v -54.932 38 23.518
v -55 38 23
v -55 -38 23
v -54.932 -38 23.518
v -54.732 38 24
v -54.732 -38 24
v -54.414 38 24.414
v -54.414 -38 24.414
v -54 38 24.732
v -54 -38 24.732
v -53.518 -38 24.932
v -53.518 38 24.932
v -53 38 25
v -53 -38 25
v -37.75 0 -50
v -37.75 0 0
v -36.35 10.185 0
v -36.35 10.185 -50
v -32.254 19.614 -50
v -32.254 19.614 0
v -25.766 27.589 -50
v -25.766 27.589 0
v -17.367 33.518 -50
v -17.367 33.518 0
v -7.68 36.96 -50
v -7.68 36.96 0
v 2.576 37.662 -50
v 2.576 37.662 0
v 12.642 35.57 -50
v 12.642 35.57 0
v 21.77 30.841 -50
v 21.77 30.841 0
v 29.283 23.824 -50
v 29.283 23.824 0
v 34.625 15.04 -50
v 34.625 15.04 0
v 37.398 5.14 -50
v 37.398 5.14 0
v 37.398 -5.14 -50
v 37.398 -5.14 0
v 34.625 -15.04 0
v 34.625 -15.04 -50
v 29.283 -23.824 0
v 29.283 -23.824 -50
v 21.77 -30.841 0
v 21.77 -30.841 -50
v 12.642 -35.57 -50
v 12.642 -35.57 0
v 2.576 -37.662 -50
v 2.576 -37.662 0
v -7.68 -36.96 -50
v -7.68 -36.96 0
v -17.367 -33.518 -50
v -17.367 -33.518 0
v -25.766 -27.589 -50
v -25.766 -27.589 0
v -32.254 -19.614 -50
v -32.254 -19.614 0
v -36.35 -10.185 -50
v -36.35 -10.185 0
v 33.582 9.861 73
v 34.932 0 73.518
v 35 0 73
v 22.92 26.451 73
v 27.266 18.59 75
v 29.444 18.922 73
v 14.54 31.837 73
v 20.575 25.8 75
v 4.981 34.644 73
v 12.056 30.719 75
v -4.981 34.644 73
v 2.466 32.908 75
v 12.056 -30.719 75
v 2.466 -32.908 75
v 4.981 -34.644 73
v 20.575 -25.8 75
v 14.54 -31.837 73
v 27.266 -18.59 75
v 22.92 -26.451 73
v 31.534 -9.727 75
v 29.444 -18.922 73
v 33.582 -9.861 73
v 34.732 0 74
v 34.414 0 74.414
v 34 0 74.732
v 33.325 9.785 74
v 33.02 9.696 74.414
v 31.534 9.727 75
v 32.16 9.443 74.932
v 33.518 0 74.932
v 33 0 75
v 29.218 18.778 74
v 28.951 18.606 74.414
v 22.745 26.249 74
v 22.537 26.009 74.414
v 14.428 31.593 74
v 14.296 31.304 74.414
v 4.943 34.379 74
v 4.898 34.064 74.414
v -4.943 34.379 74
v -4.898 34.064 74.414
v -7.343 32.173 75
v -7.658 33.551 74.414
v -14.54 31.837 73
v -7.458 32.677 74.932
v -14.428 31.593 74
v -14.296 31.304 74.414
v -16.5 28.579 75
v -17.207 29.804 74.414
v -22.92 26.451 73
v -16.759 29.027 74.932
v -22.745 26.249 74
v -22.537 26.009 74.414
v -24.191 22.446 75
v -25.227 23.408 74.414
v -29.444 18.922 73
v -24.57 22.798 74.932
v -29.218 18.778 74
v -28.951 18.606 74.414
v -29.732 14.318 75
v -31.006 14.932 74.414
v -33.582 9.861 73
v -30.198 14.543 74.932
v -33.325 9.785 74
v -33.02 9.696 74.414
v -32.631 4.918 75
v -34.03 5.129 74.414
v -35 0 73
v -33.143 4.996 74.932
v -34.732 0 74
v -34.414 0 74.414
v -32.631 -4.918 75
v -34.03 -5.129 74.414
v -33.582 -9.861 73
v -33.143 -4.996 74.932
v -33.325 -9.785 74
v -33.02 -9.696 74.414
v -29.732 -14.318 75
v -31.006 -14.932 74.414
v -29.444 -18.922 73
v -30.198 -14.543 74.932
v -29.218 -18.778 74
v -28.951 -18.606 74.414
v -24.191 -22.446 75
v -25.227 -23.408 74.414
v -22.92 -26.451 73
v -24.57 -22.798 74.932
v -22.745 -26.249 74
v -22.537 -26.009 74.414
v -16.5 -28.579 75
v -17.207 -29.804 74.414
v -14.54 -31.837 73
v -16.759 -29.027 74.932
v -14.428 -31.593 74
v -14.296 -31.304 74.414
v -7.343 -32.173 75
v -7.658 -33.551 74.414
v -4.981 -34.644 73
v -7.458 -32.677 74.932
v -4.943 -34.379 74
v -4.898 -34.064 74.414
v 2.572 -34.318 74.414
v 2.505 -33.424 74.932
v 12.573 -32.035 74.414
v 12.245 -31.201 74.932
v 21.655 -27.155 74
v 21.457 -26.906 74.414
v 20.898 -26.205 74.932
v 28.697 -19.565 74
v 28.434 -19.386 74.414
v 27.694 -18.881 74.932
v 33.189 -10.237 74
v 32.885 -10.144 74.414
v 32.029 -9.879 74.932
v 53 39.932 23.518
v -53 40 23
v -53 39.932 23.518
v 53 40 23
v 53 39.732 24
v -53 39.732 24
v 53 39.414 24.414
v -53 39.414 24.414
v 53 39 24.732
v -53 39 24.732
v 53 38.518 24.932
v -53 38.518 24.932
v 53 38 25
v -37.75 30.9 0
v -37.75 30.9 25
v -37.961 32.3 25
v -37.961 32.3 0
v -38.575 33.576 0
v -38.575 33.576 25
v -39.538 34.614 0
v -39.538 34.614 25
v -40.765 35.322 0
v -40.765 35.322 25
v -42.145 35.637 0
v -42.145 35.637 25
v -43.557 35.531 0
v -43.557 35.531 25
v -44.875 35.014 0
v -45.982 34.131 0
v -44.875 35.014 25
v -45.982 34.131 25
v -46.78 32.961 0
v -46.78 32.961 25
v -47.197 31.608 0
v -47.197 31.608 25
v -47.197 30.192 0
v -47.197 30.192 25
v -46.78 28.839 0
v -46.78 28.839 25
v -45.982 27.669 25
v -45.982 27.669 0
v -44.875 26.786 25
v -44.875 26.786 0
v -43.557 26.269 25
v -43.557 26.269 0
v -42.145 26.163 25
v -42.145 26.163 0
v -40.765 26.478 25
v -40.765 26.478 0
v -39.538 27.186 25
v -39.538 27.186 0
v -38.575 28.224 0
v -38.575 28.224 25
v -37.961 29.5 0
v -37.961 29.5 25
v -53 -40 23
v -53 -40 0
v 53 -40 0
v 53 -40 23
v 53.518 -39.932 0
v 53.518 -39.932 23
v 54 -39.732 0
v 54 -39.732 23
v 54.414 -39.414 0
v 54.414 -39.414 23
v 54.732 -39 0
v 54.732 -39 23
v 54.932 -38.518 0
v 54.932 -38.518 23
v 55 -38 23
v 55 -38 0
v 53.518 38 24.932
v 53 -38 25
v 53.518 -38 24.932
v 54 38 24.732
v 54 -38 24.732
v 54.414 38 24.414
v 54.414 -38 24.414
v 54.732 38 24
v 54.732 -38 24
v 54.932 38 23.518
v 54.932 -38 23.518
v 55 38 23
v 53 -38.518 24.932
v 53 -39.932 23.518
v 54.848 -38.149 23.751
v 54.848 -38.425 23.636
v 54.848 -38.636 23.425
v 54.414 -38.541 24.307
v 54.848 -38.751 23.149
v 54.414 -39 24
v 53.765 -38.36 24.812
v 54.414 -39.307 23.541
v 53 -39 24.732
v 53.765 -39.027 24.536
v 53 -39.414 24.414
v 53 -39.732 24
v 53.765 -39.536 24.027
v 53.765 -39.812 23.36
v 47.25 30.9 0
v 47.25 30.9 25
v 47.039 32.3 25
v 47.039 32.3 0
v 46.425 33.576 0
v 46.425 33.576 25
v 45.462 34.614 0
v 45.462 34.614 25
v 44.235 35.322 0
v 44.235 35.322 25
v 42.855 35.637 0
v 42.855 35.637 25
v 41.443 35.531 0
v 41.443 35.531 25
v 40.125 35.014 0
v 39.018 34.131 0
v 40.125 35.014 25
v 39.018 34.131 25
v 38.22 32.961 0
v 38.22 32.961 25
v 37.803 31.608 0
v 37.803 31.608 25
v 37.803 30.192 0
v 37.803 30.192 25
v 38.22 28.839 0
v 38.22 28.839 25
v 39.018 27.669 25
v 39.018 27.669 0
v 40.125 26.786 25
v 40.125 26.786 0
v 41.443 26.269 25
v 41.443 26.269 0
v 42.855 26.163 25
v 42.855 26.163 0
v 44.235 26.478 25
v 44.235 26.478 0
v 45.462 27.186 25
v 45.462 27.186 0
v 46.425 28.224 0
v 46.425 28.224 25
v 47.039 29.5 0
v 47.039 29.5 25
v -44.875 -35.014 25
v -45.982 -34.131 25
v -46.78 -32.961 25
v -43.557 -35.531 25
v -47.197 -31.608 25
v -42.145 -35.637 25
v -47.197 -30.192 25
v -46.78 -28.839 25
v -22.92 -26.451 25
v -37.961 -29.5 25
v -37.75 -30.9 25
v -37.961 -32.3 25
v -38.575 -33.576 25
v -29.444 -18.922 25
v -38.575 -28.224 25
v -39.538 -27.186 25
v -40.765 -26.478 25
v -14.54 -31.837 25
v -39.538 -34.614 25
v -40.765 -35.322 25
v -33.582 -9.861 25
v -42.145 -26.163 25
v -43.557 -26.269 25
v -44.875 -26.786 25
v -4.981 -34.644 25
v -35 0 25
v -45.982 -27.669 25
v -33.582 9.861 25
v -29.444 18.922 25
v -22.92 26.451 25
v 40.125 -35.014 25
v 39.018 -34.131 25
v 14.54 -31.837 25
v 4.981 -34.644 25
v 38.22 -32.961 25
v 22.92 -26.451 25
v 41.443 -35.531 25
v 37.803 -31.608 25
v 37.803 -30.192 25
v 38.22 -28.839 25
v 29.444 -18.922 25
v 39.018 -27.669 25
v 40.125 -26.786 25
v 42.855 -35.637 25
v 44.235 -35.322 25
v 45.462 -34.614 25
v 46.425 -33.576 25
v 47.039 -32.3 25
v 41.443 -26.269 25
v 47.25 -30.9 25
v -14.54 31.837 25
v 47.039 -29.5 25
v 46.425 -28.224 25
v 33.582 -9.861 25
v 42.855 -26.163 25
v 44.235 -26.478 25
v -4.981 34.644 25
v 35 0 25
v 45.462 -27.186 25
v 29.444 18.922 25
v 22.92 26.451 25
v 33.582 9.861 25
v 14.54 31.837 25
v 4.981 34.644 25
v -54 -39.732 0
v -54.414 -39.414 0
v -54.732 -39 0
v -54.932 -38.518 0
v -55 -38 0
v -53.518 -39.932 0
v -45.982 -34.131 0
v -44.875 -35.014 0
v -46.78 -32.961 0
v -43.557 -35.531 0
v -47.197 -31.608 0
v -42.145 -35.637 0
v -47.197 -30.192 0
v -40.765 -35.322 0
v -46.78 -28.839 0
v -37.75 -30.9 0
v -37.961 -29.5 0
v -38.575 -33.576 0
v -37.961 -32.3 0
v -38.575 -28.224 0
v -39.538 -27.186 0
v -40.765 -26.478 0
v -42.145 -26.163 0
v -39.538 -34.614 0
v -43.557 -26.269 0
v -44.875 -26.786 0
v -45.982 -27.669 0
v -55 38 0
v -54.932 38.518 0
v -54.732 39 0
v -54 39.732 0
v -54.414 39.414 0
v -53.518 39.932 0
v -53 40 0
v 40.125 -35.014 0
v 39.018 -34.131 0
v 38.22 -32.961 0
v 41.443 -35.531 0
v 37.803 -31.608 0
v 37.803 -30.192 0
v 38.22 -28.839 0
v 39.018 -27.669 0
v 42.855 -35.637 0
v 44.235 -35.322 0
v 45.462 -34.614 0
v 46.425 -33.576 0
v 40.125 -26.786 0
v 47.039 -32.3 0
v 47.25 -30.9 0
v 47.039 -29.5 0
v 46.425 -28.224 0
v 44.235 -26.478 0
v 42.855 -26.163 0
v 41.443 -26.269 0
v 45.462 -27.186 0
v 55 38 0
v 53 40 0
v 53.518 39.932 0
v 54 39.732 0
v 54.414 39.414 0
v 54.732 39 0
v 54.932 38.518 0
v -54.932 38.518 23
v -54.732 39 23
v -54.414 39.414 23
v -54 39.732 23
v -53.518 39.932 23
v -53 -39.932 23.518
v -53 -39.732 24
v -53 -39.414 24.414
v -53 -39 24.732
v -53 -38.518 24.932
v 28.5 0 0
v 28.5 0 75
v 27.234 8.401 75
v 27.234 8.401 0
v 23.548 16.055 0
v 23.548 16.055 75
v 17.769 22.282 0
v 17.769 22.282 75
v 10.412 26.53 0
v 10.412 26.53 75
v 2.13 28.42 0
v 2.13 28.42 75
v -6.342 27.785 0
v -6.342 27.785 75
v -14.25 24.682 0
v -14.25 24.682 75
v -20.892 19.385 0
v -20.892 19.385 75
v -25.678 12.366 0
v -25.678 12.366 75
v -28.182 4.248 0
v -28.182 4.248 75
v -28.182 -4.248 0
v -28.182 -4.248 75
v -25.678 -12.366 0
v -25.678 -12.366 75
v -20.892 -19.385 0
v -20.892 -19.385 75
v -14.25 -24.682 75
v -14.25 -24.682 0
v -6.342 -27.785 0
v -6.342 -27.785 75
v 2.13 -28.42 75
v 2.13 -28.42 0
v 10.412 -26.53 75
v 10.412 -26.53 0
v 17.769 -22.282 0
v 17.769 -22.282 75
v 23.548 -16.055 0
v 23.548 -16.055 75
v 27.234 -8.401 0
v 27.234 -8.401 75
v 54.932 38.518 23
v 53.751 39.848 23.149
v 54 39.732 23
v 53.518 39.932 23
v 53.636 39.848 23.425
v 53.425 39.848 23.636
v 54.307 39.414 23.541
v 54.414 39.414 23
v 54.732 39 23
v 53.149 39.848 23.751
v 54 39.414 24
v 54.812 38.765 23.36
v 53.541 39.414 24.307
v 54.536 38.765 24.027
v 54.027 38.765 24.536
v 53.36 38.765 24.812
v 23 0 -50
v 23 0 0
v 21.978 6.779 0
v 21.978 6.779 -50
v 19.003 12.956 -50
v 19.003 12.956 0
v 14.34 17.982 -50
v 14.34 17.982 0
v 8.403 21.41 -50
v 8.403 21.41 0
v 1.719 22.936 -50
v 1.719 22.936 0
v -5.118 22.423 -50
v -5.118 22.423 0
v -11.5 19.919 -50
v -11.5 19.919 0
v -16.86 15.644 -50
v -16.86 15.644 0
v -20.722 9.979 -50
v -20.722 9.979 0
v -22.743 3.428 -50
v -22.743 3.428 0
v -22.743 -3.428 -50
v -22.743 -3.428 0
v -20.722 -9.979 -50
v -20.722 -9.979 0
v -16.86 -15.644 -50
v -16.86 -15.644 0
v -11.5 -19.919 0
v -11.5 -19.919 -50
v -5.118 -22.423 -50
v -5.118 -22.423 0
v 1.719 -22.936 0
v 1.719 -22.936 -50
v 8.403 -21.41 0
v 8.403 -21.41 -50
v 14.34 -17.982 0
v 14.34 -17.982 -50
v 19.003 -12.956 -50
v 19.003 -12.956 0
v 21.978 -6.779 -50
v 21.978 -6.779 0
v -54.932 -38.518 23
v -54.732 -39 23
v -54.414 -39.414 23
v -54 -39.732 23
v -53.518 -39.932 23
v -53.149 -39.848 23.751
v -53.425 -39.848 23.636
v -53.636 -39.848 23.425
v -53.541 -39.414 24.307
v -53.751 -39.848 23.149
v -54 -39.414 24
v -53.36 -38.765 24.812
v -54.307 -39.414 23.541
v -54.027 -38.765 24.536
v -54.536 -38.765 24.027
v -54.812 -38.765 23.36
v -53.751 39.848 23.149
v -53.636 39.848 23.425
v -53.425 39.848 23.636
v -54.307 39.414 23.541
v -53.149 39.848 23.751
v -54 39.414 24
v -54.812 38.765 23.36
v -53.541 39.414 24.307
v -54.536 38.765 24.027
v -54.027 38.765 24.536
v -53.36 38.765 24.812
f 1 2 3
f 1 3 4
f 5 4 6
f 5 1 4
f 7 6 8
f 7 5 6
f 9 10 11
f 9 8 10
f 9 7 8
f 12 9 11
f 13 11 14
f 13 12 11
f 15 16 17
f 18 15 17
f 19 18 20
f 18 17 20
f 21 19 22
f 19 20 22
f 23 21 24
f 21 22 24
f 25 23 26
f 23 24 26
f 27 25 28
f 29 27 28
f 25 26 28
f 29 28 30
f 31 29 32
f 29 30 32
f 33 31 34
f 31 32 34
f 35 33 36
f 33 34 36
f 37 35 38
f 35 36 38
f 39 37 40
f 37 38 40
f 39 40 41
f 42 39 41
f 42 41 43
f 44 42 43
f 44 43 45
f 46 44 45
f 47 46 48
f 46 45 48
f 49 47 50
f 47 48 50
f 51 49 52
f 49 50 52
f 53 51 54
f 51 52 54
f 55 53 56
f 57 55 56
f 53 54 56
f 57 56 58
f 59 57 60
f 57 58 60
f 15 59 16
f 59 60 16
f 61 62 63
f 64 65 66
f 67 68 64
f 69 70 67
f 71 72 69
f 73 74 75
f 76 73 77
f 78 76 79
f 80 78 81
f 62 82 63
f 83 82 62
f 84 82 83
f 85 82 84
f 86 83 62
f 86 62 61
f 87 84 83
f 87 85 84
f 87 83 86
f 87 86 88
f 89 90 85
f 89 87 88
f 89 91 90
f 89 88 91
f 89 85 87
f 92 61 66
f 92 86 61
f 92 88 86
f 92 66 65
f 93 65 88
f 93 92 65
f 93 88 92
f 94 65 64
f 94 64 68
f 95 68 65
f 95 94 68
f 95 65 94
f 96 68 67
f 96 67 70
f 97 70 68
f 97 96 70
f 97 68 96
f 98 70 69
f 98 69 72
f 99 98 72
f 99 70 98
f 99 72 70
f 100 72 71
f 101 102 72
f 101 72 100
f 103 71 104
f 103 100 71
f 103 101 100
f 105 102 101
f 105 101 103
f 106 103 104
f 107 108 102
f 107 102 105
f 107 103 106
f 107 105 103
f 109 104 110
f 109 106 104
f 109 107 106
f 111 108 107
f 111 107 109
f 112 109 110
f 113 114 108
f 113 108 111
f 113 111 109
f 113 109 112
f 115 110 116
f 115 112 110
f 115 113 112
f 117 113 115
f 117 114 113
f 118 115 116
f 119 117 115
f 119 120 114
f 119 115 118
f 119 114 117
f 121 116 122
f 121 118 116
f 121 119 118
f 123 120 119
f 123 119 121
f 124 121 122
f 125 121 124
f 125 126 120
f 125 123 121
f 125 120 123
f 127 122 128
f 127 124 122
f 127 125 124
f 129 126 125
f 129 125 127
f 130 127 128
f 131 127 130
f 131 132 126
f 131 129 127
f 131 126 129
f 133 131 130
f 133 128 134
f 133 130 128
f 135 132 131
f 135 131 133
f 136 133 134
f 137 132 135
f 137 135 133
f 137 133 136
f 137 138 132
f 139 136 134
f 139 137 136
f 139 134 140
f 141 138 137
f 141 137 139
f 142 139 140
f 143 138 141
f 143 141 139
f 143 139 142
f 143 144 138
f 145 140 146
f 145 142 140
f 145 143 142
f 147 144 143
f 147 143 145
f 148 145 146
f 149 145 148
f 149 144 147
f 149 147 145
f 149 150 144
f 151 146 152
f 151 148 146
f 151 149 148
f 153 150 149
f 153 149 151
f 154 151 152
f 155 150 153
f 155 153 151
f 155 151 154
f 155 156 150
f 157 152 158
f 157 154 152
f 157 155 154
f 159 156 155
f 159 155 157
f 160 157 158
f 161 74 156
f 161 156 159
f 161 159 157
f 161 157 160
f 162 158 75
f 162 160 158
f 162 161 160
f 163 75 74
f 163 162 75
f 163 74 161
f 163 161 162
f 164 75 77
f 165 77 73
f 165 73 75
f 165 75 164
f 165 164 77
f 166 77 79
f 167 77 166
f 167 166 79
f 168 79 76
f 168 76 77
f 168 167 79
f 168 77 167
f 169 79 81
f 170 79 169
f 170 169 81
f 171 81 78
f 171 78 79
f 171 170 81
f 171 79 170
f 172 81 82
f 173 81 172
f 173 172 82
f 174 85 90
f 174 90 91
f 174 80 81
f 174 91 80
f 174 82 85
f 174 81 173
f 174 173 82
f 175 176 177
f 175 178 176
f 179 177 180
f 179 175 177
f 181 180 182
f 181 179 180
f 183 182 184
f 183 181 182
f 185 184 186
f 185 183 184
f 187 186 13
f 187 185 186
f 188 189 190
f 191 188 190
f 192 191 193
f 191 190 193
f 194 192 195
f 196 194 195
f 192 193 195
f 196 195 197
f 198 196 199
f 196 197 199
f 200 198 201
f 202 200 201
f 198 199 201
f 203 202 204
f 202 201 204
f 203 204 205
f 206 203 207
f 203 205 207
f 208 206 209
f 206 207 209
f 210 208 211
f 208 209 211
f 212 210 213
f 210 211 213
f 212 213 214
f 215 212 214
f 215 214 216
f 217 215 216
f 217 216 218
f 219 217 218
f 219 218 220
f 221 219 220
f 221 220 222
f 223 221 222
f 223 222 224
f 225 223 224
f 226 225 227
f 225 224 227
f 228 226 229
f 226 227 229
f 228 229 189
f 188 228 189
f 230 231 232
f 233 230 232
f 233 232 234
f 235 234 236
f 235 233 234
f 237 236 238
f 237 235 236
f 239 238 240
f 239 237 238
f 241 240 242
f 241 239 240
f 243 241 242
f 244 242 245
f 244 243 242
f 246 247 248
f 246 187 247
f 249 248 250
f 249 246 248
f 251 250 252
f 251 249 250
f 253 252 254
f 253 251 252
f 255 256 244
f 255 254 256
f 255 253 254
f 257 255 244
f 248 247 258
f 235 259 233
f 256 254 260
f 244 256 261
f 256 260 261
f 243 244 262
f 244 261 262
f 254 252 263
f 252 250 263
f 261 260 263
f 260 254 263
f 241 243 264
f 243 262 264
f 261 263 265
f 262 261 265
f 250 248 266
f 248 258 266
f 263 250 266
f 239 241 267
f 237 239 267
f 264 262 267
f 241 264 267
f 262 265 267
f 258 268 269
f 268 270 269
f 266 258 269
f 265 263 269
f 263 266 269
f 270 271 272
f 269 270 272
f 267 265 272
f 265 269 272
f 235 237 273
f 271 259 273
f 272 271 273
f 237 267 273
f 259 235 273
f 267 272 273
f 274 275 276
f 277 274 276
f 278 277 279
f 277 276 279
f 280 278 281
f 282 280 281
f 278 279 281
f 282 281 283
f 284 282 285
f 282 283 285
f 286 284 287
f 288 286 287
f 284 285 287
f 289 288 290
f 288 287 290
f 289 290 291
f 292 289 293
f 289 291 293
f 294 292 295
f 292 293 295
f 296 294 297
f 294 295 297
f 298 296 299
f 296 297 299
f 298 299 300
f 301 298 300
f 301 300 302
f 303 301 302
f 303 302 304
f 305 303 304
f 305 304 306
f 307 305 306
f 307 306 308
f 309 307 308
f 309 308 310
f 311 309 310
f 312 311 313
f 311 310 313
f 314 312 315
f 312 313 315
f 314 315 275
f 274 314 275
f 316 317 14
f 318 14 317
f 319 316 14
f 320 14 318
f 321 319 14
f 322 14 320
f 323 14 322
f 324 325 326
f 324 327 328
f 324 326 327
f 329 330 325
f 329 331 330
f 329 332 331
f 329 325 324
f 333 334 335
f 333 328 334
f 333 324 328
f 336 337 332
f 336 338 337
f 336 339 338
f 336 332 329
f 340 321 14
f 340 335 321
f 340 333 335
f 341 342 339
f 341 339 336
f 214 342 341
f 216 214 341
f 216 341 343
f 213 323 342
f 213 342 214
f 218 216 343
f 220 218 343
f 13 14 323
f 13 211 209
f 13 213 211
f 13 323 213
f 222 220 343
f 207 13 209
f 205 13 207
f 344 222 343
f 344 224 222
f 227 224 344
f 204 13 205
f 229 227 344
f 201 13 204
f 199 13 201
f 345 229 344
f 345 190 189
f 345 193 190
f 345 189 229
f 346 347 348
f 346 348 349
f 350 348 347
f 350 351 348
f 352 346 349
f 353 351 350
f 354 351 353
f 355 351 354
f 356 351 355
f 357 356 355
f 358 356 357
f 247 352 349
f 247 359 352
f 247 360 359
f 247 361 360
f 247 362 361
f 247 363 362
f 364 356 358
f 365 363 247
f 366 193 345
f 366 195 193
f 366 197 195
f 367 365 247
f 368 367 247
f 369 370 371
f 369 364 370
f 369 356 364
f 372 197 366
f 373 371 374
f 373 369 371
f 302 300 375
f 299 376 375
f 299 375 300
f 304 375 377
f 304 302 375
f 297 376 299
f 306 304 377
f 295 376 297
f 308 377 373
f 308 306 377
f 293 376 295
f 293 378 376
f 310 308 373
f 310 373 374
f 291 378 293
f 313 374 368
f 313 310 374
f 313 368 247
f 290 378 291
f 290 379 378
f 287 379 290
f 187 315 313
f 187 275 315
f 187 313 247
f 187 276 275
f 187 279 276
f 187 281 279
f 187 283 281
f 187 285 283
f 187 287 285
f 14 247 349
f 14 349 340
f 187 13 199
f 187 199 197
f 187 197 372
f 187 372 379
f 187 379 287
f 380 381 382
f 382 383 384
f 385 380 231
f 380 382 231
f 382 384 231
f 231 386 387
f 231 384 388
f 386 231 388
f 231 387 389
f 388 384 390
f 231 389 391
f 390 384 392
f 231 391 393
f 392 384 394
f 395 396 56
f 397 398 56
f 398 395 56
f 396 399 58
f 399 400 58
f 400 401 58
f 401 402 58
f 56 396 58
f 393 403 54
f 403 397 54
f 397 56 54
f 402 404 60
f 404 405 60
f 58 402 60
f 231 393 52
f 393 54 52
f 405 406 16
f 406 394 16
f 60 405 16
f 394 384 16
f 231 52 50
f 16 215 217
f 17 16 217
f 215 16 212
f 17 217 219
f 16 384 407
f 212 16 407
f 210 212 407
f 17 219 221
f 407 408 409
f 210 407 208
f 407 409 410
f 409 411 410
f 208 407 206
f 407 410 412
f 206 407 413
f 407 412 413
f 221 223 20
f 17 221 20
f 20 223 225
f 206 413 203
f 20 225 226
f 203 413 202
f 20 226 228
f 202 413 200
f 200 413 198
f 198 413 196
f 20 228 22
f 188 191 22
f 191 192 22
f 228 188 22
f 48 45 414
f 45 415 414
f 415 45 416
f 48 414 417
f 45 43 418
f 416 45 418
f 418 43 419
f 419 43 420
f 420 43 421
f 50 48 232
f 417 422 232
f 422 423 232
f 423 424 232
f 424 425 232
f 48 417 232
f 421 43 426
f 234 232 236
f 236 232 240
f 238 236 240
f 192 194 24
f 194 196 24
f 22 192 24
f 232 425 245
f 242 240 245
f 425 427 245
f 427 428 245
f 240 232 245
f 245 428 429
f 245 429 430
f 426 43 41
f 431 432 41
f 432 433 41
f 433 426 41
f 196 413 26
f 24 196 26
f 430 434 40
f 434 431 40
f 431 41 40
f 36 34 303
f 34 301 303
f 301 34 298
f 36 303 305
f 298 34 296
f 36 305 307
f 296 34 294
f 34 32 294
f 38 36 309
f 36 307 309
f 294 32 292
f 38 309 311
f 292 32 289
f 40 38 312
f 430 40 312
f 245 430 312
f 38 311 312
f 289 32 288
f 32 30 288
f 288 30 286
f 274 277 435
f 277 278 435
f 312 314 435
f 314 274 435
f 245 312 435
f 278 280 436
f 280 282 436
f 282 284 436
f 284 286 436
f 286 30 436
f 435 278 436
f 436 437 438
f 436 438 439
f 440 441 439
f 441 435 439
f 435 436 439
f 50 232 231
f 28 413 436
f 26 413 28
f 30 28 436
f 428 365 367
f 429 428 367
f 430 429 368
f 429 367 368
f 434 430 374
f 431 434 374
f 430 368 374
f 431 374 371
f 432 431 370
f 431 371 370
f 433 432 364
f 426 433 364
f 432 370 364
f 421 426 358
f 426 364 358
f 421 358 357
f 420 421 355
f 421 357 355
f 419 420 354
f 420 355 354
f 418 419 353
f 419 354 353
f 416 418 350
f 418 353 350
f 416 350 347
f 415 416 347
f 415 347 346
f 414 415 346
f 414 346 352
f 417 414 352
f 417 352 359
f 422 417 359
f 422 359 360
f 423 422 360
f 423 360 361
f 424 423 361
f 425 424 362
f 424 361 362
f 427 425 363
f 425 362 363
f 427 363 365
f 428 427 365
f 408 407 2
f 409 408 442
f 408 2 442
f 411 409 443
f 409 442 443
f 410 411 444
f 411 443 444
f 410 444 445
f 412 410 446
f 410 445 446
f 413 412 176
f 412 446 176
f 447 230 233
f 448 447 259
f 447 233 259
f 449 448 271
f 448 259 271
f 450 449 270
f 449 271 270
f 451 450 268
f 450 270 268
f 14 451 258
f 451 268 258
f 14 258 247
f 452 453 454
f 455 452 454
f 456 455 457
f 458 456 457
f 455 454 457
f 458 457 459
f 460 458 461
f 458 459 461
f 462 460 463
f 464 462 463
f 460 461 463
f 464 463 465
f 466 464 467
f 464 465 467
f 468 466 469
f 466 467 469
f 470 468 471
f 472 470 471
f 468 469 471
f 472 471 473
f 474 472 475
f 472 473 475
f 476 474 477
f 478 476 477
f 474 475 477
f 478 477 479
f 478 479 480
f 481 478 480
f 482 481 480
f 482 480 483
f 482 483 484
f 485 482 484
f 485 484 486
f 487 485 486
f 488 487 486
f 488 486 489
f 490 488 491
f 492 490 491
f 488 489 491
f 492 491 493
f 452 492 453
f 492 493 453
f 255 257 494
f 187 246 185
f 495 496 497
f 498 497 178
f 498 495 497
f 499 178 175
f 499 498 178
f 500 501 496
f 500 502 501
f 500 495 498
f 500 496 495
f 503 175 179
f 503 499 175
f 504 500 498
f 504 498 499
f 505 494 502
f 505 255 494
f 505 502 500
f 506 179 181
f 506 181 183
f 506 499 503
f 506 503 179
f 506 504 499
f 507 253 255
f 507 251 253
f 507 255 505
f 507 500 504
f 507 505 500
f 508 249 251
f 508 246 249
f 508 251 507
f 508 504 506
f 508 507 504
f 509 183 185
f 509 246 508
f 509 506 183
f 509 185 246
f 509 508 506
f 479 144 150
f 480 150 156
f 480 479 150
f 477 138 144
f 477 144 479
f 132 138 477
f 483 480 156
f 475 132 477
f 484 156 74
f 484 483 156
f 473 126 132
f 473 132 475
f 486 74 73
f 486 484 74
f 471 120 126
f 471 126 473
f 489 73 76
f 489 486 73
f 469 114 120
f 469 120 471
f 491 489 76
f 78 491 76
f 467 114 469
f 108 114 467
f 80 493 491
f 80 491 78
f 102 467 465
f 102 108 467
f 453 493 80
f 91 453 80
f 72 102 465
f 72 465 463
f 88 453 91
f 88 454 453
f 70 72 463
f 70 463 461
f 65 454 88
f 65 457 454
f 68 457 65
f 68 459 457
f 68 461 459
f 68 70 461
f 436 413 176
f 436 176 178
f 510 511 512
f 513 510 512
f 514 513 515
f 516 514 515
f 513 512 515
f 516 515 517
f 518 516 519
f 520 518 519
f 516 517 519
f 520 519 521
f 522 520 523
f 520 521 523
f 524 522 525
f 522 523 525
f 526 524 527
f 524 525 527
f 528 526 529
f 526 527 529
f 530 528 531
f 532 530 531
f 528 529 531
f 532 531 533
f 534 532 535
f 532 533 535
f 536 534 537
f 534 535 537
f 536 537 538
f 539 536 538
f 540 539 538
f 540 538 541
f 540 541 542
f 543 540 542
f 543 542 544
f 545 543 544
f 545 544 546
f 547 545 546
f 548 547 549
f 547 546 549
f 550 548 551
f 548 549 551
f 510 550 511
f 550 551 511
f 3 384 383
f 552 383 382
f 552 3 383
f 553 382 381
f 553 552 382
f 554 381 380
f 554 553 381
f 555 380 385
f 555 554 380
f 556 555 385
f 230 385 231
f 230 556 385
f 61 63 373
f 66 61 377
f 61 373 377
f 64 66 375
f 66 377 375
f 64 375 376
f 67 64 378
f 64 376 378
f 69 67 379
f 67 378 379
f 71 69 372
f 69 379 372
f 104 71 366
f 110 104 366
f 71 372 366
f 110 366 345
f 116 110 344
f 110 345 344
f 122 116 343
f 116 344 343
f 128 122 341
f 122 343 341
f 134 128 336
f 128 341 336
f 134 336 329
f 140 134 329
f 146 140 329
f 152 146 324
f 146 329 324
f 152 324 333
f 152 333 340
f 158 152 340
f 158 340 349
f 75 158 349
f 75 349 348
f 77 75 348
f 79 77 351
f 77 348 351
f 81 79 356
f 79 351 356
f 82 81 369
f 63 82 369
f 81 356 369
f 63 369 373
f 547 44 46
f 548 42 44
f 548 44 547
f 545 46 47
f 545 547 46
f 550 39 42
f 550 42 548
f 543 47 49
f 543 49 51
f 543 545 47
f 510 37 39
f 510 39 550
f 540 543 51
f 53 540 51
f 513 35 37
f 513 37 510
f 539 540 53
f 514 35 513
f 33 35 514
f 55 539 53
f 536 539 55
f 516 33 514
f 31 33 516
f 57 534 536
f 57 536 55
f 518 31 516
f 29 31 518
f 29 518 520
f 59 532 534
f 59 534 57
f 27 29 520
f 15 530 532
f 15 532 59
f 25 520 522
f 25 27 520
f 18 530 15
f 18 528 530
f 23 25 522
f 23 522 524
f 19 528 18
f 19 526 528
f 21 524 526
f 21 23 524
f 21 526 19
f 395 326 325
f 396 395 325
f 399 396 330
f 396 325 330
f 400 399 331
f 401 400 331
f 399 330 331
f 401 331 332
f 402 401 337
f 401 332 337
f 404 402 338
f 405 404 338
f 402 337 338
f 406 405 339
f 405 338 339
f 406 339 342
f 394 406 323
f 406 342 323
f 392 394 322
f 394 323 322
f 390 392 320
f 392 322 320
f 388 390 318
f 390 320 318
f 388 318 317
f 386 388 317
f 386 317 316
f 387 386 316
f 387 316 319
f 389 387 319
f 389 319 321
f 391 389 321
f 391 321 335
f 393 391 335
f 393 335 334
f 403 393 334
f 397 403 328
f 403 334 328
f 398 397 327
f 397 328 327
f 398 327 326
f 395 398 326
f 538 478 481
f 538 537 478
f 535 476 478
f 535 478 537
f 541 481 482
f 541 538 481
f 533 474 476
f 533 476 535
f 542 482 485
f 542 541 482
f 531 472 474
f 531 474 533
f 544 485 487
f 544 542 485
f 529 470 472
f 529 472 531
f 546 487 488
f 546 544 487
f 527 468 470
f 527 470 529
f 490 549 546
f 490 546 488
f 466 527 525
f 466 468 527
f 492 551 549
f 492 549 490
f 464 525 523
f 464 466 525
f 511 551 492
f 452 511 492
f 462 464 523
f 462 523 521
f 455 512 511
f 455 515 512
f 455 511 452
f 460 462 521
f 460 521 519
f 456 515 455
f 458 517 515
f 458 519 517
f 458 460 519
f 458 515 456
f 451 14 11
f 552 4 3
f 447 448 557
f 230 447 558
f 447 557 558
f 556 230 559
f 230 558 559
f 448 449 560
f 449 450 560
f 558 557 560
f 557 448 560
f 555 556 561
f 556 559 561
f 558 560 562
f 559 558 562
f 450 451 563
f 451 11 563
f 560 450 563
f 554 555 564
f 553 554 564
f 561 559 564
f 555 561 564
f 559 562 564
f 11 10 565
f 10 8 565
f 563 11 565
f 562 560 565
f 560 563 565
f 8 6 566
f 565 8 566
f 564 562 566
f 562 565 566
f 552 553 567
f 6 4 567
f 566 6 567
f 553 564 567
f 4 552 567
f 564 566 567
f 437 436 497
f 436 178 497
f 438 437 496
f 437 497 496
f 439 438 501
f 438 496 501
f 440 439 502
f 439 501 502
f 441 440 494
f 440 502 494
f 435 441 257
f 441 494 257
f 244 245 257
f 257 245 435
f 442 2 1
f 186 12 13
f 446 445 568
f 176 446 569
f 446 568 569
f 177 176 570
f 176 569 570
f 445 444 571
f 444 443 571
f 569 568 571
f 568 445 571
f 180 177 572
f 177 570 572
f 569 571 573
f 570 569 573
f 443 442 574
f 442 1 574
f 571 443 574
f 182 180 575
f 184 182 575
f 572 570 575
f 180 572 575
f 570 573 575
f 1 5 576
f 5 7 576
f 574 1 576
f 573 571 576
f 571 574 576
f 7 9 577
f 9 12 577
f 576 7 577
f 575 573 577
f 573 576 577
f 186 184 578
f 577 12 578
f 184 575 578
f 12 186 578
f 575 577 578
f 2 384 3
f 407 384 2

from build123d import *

# Parameters (mm, degrees)
SKETCH1_W            = 110
SKETCH1_H            = 80
BOSS_EXTRUDE1_DEPTH  = 25
SKETCH2_R            = 4.75
CUT_EXTRUDE1_DEPTH   = 25
LPATTERN1_COUNT      = 2
LPATTERN1_PITCH      = 85
LPATTERN1_COUNT_DIR2 = 2
LPATTERN1_PITCH_DIR2 = 61.8
SKETCH3_R            = 35
BOSS_EXTRUDE2_DEPTH  = 50
SKETCH4_R            = 37.75
BOSS_EXTRUDE3_DEPTH  = 50
SKETCH5_R            = 28.5
CUT_EXTRUDE2_DEPTH   = 75
SKETCH6_R            = 23
CUT_EXTRUDE3_DEPTH   = 50
FILLET1_R            = 2


with BuildPart() as part:
    # Sketch1 → Boss-Extrude1 (new body)
    with BuildSketch(Plane.XY):
        Rectangle(SKETCH1_W, SKETCH1_H)
    extrude(amount=BOSS_EXTRUDE1_DEPTH)

    # Sketch2 → Cut-Extrude1 (cut)
    with BuildSketch(Plane.XY.offset(25)):
        with Locations((-42.5, -30.9)):
            Circle(SKETCH2_R)
    cut_extrude1 = extrude(amount=-CUT_EXTRUDE1_DEPTH, mode=Mode.SUBTRACT)

    # LPattern1: Cut-Extrude1 2 × 2
    with Locations(*[(i * LPATTERN1_PITCH, j * LPATTERN1_PITCH_DIR2, 0) for i in range(LPATTERN1_COUNT) for j in range(LPATTERN1_COUNT_DIR2) if (i, j) != (0, 0)]):
        add(cut_extrude1, mode=Mode.SUBTRACT)

    # Sketch3 → Boss-Extrude2 (add)
    with BuildSketch(Plane.XY.offset(25)):
        Circle(SKETCH3_R)
    extrude(amount=BOSS_EXTRUDE2_DEPTH)

    # Sketch4 → Boss-Extrude3 (add)
    with BuildSketch(Plane(origin=(0, 0, 0), x_dir=(-1, 0, 0), z_dir=(0, 0, -1))):
        Circle(SKETCH4_R)
    extrude(amount=BOSS_EXTRUDE3_DEPTH)

    # Sketch5 → Cut-Extrude2 (cut)
    with BuildSketch(Plane.XY.offset(75)):
        Circle(SKETCH5_R)
    extrude(amount=-CUT_EXTRUDE2_DEPTH, mode=Mode.SUBTRACT)

    # Sketch6 → Cut-Extrude3 (cut)
    with BuildSketch(Plane.XY):
        Circle(SKETCH6_R)
    extrude(amount=-CUT_EXTRUDE3_DEPTH, mode=Mode.SUBTRACT)

    # Fillet1
    fillet1_edges = [part.edges().sort_by_distance(p)[0] for p in [
        (-55, 0, 25),
        (0, -40, 25),
        (-35, 0, 75),
        (55, 0, 25),
        (55, -40, 12.5),
        (-55, -40, 12.5),
        (-55, 40, 12.5),
        (55, 40, 12.5),
        (0, 40, 25),
    ]]
    fillet(fillet1_edges, radius=FILLET1_R)


solid = part.part
